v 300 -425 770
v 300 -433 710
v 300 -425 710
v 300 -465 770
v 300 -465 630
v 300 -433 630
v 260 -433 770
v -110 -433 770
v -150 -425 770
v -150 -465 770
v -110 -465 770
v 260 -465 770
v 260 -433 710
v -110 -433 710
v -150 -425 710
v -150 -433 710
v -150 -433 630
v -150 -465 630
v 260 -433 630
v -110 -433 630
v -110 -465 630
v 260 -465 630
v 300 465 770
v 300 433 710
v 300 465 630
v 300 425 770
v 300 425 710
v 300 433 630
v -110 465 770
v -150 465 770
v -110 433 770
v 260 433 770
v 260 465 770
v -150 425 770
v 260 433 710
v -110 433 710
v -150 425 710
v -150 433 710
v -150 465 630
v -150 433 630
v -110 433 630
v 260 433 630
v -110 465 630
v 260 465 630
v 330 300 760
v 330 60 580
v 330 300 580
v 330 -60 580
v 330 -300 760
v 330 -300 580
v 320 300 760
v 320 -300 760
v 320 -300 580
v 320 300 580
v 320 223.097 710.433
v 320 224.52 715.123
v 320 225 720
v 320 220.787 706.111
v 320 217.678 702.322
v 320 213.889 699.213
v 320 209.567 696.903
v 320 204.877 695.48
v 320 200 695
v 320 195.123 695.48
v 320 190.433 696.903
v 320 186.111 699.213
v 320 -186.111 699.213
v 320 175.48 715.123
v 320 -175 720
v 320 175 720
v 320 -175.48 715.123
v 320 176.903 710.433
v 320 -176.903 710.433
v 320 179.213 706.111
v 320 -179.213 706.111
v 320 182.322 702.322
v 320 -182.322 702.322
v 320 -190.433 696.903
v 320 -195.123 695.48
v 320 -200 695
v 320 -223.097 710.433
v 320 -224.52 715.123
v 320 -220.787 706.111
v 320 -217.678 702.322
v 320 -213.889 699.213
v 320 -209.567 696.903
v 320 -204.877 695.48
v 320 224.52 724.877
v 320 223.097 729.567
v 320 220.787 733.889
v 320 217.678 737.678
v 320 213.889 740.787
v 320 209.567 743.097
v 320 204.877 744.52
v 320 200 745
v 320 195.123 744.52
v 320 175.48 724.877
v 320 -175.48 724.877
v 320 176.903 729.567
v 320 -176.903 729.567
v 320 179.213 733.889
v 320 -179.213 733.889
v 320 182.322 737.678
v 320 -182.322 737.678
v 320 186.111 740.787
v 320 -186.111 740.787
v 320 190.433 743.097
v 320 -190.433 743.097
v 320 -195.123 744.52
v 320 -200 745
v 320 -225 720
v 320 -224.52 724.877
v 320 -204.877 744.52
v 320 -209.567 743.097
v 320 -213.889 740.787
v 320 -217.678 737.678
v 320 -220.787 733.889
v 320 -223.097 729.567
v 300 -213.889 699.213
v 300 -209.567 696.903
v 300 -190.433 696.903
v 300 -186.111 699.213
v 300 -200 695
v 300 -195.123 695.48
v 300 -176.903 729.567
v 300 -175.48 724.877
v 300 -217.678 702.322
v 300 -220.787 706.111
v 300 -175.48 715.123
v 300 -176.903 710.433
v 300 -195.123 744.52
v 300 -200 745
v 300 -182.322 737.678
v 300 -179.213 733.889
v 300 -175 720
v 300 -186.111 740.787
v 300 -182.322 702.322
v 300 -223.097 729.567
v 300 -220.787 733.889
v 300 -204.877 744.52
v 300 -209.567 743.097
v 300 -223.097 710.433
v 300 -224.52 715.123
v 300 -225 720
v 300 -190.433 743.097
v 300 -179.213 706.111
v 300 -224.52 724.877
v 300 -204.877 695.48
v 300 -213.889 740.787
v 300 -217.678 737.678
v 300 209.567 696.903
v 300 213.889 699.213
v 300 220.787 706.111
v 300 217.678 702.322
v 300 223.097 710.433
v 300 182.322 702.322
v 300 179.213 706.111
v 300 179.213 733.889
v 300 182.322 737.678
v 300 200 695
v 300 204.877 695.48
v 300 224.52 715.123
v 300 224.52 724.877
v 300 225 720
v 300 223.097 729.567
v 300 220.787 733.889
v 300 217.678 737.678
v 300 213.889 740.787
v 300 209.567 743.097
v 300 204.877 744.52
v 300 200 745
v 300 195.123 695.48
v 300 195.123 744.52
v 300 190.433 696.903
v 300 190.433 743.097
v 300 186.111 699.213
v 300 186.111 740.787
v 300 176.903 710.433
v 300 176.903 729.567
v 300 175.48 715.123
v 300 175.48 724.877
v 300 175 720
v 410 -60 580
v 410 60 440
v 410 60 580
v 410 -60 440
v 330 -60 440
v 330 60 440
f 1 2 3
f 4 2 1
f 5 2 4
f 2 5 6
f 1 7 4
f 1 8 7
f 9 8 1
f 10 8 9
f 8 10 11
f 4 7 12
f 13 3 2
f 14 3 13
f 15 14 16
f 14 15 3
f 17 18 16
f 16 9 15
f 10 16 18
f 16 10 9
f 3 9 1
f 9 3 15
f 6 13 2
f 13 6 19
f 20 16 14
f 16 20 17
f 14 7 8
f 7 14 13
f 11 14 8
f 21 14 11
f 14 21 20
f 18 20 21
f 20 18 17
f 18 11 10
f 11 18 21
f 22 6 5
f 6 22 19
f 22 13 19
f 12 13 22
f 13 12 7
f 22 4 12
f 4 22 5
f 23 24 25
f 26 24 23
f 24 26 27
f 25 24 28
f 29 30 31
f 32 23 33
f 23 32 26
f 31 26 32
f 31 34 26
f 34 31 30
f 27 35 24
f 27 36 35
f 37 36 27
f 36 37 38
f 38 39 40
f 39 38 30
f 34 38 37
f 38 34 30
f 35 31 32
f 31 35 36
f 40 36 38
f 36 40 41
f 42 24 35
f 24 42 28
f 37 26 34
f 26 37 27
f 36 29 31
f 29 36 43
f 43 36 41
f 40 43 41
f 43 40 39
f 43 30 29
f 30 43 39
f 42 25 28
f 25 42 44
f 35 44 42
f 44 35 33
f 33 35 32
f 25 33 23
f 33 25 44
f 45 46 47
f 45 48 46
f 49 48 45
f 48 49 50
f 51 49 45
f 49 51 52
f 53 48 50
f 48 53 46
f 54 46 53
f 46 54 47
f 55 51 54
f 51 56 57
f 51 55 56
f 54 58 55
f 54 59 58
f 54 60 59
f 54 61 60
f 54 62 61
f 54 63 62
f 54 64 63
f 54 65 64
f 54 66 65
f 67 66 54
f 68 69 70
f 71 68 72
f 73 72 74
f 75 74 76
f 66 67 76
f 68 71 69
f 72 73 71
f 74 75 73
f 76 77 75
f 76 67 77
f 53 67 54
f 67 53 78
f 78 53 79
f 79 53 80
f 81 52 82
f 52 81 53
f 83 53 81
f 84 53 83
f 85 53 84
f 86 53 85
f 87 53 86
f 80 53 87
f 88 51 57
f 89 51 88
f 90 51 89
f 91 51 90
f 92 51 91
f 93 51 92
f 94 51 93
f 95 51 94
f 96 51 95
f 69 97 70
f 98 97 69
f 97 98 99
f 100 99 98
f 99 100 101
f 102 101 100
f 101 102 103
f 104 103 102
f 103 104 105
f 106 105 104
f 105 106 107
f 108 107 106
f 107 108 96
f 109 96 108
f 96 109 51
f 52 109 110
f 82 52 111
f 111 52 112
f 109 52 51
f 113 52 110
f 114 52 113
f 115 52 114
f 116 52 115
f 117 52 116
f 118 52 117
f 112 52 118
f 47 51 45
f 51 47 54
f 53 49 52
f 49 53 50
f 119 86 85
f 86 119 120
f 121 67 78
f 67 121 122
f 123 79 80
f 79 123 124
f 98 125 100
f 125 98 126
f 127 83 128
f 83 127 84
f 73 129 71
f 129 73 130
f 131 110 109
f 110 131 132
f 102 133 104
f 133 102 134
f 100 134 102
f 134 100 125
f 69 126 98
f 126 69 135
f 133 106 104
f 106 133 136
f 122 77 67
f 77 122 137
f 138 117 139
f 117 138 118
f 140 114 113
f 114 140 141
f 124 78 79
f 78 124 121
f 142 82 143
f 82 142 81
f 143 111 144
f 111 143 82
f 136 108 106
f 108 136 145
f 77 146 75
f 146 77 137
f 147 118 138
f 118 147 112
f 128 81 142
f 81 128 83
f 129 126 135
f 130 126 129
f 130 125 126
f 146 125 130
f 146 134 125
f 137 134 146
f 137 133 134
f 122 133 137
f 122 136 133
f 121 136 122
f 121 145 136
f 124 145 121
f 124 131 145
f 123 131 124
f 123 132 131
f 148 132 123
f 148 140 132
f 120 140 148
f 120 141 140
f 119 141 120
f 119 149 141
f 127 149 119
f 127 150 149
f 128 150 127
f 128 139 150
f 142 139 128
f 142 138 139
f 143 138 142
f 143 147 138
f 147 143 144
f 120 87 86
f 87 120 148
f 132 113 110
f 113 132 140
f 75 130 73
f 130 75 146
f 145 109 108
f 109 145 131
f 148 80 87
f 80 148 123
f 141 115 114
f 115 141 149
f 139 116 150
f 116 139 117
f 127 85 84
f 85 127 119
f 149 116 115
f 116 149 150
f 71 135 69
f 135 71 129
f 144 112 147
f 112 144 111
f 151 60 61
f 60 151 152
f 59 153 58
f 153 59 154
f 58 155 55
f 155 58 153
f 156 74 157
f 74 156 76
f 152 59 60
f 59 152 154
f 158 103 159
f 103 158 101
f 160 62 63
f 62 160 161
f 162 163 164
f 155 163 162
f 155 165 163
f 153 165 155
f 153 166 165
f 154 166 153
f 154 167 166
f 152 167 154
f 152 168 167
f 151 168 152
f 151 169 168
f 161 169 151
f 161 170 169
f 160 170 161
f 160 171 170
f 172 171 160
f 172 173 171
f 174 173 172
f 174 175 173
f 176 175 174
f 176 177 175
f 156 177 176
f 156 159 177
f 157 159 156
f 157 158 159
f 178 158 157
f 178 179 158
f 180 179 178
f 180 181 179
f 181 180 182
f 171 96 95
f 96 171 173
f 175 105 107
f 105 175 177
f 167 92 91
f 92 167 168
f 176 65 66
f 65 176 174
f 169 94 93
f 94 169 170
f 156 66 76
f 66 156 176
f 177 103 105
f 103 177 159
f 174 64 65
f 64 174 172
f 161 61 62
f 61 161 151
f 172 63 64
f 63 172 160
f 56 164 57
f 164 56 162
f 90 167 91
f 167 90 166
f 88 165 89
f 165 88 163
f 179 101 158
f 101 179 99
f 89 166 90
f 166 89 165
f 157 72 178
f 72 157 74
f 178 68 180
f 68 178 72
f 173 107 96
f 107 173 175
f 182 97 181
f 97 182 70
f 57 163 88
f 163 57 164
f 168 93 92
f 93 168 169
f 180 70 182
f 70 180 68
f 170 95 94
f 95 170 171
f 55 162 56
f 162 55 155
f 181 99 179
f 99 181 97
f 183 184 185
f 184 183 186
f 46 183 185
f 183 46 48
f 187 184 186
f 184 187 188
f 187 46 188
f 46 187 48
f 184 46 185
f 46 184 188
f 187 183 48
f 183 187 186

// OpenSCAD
// pd_end - generated by conv_3d.py from out/mech/module_specs.json (F4.2) - units mm
// DESIGN - check and release before manufacture. Local axes: x travel, y across, z up, conveyor top z = 700.

top = 700.0;
cW = 800;

module pd_end() {
  translate([-150.00, -433.00, 710.00]) cube([450.00, 8.00, 60.00]);
  translate([-150.00, -465.00, 630.00]) cube([40.00, 32.00, 140.00]);
  translate([260.00, -465.00, 630.00]) cube([40.00, 32.00, 140.00]);
  translate([-150.00, 425.00, 710.00]) cube([450.00, 8.00, 60.00]);
  translate([-150.00, 433.00, 630.00]) cube([40.00, 32.00, 140.00]);
  translate([260.00, 433.00, 630.00]) cube([40.00, 32.00, 140.00]);
  translate([320.00, -300.00, 580.00]) cube([10.00, 600.00, 180.00]);
  translate([310.00, -200.00, 720.00]) rotate([0, 90, 0]) cylinder(r = 25.00, h = 20.00, center = true, $fn = 32);
  translate([310.00, 200.00, 720.00]) rotate([0, 90, 0]) cylinder(r = 25.00, h = 20.00, center = true, $fn = 32);
  translate([330.00, -60.00, 440.00]) cube([80.00, 120.00, 140.00]);
}
pd_end();
